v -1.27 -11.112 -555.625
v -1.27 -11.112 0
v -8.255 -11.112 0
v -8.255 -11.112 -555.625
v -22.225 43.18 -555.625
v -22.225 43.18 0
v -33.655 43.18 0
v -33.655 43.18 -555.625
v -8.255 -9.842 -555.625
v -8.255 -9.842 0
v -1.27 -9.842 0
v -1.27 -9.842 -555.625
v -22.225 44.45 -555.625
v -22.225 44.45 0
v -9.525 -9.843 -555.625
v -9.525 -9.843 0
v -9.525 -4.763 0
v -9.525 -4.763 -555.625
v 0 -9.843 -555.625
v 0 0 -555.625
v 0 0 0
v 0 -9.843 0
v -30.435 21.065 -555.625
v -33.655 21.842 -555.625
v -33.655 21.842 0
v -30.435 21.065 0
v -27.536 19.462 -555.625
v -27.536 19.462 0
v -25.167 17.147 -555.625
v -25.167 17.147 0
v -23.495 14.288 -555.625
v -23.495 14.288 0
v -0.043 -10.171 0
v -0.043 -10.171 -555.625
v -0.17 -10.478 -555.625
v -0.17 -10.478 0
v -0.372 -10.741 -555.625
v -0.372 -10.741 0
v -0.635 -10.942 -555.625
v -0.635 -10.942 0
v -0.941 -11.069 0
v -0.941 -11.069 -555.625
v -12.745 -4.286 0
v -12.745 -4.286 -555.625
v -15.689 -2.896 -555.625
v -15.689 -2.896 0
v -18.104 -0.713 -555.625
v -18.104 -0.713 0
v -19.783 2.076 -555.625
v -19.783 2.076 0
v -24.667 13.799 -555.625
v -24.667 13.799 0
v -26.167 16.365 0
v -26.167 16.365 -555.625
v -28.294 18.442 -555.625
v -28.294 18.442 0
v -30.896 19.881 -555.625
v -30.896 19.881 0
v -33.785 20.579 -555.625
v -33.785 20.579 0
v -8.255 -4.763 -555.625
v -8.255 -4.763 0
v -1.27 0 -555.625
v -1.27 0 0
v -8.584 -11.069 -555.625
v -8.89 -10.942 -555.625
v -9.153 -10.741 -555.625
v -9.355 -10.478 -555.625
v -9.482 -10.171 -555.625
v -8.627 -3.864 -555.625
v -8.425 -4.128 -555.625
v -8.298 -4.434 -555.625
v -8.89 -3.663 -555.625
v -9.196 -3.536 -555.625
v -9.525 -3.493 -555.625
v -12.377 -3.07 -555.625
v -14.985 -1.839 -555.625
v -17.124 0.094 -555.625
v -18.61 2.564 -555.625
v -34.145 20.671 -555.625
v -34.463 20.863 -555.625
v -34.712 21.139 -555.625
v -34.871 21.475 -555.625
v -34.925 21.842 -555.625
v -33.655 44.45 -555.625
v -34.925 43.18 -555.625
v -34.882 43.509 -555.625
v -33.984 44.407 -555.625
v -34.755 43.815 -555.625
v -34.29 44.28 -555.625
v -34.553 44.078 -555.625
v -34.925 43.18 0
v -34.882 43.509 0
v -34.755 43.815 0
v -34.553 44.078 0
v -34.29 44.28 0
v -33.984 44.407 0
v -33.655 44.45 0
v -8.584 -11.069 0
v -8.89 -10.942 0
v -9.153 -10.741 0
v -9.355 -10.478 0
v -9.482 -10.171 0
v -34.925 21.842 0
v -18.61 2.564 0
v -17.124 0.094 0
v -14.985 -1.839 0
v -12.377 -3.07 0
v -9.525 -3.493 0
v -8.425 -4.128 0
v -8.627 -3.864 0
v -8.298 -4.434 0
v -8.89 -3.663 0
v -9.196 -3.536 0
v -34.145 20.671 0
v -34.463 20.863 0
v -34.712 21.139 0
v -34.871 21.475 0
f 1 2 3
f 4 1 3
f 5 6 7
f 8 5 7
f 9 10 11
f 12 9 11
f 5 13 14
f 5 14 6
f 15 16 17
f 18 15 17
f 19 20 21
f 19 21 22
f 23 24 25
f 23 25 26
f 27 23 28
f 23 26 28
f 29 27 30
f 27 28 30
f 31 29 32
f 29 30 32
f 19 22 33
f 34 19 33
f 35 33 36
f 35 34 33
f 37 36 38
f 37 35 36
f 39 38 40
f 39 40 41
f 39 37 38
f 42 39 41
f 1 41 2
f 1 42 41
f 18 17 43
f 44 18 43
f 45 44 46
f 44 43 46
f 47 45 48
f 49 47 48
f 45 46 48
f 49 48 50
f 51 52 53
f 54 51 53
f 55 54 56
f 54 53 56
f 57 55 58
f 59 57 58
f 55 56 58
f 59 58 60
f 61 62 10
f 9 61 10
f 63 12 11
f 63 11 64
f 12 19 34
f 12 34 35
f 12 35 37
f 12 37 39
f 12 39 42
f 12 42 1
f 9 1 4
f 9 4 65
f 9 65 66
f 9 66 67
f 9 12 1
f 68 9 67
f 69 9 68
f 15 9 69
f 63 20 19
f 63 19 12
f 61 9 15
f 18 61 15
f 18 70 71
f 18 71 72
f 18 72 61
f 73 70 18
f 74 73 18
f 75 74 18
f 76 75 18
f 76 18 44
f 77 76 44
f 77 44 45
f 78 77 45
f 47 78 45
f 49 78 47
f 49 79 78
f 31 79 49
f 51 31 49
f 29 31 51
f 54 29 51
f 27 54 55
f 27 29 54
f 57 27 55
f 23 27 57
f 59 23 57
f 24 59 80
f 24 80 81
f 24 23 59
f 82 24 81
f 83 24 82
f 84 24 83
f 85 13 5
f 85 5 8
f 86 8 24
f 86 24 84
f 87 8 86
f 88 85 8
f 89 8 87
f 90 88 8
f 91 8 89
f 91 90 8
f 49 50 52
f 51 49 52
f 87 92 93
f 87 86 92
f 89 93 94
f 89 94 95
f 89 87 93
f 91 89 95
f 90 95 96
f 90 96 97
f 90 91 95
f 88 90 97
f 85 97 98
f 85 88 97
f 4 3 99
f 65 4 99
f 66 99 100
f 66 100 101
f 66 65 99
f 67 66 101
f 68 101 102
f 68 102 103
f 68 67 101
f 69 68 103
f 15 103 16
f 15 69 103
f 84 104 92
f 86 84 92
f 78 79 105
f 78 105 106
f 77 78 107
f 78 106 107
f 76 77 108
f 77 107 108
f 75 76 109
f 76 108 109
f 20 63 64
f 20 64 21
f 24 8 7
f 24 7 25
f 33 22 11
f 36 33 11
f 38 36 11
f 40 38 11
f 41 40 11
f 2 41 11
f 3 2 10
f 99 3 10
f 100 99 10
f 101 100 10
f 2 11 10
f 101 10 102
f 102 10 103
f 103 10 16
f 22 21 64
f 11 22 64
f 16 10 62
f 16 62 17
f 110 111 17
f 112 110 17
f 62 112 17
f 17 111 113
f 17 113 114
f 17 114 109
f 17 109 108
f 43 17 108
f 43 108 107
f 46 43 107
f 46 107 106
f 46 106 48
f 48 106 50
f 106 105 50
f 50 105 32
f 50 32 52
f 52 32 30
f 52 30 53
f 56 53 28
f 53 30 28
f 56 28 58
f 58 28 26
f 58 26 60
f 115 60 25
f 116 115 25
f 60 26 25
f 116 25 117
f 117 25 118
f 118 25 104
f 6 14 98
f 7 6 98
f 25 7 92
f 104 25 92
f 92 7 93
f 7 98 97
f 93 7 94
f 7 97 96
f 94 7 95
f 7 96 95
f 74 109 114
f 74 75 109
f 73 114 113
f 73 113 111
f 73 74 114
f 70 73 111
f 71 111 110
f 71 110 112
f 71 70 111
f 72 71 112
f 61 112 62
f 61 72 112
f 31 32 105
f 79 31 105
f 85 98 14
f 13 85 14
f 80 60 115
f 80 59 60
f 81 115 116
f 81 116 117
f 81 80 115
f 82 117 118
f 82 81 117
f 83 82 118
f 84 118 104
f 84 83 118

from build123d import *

# Parameters (mm, degrees)
EXTRUDE_THIN1_DEPTH = 555.625
FILLET1_R           = 1.27


with BuildPart() as part:
    # Sketch1 → Extrude-Thin1 (new body)
    with BuildSketch(Plane.XY):
        with BuildLine():
            Line((0, 0), (0, -11.1125))
            Line((0, -11.1125), (-9.525, -11.1125))
            Line((-9.525, -11.1125), (-9.525, -4.7625))
            ThreePointArc((-9.525, -4.7625), (-15.689105931, -2.896158896), (-19.782692308, 2.075961538))
            Line((-19.782692308, 2.075961538), (-24.667307692, 13.799038462))
            ThreePointArc((-24.667307692, 13.799038462), (-28.760894069, 18.771158896), (-34.925, 20.6375))
            Line((-34.925, 20.6375), (-34.925, 44.45))
            Line((-34.925, 44.45), (-22.225, 44.45))
            Line((-22.225, 44.45), (-22.225, 43.18))
            Line((-22.225, 43.18), (-33.655, 43.18))
            Line((-33.655, 43.18), (-33.655, 21.842199611))
            ThreePointArc((-33.655, 21.842199611), (-27.536436435, 19.46157057), (-23.495, 14.2875))
            Line((-23.495, 14.2875), (-18.610384615, 2.564423077))
            ThreePointArc((-18.610384615, 2.564423077), (-14.443755021, -2.175295027), (-8.255, -3.410220605))
            Line((-8.255, -3.410220605), (-8.255, -9.8425))
            Line((-8.255, -9.8425), (-1.27, -9.8425))
            Line((-1.27, -9.8425), (-1.27, 0))
            Line((-1.27, 0), (0, 0))
        make_face()
    extrude(amount=-EXTRUDE_THIN1_DEPTH)

    # Fillet1
    fillet1_edges = [part.edges().sort_by_distance(p)[0] for p in [
        (-8.255, -3.410220605, -277.8125),
        (0, -11.1125, -277.8125),
        (-9.525, -11.1125, -277.8125),
        (-34.925, 20.6375, -277.8125),
        (-34.925, 44.45, -277.8125),
    ]]
    fillet(fillet1_edges, radius=FILLET1_R)


solid = part.part
